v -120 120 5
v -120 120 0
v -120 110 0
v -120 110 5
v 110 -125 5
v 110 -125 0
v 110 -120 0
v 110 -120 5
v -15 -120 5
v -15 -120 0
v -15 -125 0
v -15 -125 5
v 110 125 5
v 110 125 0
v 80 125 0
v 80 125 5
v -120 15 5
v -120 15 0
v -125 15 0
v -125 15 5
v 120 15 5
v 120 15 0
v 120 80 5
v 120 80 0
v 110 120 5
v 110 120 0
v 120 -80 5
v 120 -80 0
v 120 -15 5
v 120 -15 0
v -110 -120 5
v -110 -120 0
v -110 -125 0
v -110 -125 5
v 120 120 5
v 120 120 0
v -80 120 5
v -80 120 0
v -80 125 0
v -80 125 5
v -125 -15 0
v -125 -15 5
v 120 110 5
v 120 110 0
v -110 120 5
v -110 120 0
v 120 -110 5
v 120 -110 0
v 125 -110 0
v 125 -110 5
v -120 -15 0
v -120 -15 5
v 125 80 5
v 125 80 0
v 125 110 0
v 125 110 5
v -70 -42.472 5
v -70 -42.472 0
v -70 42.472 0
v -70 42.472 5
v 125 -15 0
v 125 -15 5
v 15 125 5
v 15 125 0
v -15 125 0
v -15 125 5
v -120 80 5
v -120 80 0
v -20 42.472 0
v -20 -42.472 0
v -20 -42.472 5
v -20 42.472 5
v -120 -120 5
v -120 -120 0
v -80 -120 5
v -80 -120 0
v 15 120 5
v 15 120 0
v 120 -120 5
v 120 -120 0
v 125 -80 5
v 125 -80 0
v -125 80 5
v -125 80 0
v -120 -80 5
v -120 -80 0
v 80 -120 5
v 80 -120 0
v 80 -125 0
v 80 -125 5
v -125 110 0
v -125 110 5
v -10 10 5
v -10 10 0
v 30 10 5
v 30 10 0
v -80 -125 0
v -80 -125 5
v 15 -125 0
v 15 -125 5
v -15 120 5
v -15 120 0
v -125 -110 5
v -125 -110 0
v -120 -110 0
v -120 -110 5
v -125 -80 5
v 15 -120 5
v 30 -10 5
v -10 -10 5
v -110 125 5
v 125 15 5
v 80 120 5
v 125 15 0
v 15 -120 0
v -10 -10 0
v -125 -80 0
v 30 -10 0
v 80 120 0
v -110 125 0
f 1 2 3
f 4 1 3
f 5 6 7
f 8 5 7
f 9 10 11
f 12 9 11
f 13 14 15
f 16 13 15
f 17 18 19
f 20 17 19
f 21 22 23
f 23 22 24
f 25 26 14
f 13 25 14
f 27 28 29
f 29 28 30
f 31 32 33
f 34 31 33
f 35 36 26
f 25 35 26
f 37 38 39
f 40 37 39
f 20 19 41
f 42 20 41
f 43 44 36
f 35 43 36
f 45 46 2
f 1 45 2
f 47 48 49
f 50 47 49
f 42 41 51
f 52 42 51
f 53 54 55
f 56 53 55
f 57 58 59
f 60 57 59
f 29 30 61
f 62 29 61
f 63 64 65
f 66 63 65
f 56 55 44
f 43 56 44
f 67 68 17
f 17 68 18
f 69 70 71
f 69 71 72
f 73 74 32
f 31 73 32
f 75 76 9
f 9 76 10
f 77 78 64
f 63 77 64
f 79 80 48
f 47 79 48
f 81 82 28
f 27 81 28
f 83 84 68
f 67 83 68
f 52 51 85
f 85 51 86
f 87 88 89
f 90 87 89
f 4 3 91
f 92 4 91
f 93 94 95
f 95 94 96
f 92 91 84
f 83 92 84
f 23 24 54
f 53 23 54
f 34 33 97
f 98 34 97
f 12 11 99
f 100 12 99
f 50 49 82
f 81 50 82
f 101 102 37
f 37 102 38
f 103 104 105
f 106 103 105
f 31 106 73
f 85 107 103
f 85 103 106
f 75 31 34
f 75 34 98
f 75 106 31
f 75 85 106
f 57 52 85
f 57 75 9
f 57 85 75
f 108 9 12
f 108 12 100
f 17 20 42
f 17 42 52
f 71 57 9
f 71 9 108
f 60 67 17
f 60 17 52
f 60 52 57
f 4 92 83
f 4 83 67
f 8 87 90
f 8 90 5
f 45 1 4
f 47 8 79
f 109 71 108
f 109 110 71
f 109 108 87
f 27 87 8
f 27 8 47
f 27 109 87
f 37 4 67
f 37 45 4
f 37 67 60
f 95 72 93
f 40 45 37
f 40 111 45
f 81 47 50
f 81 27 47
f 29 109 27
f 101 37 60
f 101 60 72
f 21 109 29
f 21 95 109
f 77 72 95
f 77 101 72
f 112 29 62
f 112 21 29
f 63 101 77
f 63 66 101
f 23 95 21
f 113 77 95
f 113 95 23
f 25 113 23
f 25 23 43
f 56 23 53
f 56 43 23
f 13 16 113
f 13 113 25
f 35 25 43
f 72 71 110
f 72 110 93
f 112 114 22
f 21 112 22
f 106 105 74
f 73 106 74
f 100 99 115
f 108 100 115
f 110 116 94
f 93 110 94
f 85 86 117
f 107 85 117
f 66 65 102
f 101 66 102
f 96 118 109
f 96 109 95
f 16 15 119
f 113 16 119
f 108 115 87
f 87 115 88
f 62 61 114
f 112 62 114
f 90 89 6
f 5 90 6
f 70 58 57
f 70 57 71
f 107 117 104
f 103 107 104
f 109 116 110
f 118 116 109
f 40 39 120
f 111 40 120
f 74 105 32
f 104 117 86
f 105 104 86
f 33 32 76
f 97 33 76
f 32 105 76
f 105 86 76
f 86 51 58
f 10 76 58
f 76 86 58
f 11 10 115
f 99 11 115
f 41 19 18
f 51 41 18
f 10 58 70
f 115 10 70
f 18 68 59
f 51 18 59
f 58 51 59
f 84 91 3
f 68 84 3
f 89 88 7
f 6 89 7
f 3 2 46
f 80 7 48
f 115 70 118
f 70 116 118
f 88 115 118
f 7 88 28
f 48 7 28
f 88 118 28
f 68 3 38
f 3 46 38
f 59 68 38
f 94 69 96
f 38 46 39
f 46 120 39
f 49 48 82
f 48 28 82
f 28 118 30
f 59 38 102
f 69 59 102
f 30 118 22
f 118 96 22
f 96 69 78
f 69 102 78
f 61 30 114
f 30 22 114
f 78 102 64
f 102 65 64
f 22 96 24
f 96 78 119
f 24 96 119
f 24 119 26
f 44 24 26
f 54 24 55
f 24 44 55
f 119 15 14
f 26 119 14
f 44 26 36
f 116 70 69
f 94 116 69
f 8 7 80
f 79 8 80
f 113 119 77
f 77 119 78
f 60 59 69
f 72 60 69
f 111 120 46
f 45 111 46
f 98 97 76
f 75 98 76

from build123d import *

# Parameters (mm, degrees)
SKETCH5_W           = 50
SKETCH5_H           = 84.944653118
SKETCH5_W_2         = 40
SKETCH5_H_2         = 20
BOSS_EXTRUDE1_DEPTH = 5


with BuildPart() as part:
    # Sketch5 → Boss-Extrude1 (new body)
    with BuildSketch(Plane.XY):
        Polygon((-110, 120), (-120, 120), (-120, 110), (-125, 110), (-125, 80), (-120, 80), (-120, 15), (-125, 15), (-125, -15), (-120, -15), (-120, -80), (-125, -80), (-125, -110), (-120, -110), (-120, -120), (-110, -120), (-110, -125), (-80, -125), (-80, -120), (-15, -120), (-15, -125), (15, -125), (15, -120), (80, -120), (80, -125), (110, -125), (110, -120), (120, -120), (120, -110), (125, -110), (125, -80), (120, -80), (120, -15), (125, -15), (125, 15), (120, 15), (120, 80), (125, 80), (125, 110), (120, 110), (120, 120), (110, 120), (110, 125), (80, 125), (80, 120), (15, 120), (15, 125), (-15, 125), (-15, 120), (-80, 120), (-80, 125), (-110, 125), align=None)
        with Locations((-45, 0)):
            Rectangle(SKETCH5_W, SKETCH5_H, mode=Mode.SUBTRACT)
        with Locations((10, 0)):
            Rectangle(SKETCH5_W_2, SKETCH5_H_2, mode=Mode.SUBTRACT)
    extrude(amount=BOSS_EXTRUDE1_DEPTH)


solid = part.part
